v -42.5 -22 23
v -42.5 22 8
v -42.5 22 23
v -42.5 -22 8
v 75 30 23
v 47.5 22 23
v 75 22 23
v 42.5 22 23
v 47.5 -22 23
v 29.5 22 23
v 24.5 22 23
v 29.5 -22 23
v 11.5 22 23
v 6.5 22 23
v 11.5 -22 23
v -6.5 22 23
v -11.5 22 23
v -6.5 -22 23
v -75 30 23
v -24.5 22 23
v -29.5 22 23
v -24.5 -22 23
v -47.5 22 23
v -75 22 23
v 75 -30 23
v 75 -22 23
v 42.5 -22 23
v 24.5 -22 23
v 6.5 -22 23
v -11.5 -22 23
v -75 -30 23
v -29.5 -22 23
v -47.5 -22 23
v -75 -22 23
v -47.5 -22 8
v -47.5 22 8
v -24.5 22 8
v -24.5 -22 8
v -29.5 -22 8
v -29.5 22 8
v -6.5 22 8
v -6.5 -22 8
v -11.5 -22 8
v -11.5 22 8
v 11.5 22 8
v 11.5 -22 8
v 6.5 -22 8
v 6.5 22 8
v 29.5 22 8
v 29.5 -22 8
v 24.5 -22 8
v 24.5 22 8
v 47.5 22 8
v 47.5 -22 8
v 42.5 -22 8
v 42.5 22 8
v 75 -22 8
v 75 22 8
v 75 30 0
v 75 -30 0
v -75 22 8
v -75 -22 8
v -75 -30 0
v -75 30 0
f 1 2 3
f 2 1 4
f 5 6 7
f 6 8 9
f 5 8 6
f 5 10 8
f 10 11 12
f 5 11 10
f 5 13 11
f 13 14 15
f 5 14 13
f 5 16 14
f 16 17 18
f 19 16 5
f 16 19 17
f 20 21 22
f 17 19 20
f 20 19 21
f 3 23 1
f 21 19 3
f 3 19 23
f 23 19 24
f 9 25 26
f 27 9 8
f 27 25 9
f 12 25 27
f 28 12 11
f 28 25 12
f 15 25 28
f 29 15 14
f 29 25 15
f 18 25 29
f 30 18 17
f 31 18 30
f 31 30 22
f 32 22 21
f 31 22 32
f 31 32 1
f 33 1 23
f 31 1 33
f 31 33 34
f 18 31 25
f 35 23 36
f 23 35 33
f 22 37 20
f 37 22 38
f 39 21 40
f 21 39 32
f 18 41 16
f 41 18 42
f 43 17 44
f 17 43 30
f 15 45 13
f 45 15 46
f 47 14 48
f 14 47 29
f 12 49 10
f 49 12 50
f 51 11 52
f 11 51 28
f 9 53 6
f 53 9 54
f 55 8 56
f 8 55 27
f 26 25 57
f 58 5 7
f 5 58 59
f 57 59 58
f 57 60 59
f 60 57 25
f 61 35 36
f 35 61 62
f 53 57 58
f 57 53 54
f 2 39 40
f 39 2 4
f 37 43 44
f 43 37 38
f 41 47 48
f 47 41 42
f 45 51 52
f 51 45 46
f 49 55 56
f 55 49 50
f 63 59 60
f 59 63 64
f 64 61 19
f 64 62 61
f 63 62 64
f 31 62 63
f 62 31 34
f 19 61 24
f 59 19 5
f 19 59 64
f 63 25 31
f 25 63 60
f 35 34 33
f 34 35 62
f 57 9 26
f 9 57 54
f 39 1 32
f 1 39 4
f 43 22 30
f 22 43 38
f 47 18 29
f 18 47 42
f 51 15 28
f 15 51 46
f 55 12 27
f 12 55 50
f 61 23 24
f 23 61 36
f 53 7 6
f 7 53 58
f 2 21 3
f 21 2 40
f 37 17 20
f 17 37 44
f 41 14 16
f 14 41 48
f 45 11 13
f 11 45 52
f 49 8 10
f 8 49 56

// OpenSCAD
$fn = 32;

// ----------------------------------------------------------------------
// Rib frame 150 x 60 x 23
// 6 ribs at 18 mm pitch
// ----------------------------------------------------------------------

// --- parameters (mm) ---
frame = [150, 60, 8];  // base plate size (x, y, z)
rail_w = 8;            // side rail width
ribs = 6;              // number of ribs
rib_t = 5;             // rib thickness
rib_h = 15;            // rib height above the base plate
pitch = 18;            // pitch between rib centres

// --- derived feature positions (mm) ---
span = (ribs - 1) * pitch;          // = 90   distance between the outer ribs
origin_x = -span / 2;               // = -45   X of the first rib
rib_len = frame[1] - 2 * rail_w + 2;  // = 46   rib length, 1 mm into each rail
feature_centers = [
  [origin_x + 0 * pitch, 0],
  [origin_x + 1 * pitch, 0],
  [origin_x + 2 * pitch, 0],
  [origin_x + 3 * pitch, 0],
  [origin_x + 4 * pitch, 0],
  [origin_x + 5 * pitch, 0]
];   // rib centre line, drives the rib loop

// base plate, two side rails, then the ribs read straight off feature_centers
union() {
  translate([-frame[0] / 2, -frame[1] / 2, 0]) cube(frame);
  translate([-frame[0] / 2, -frame[1] / 2, 0]) cube([frame[0], rail_w, frame[2] + rib_h]);
  translate([-frame[0] / 2, frame[1] / 2 - rail_w, 0]) cube([frame[0], rail_w, frame[2] + rib_h]);
  for (centre = feature_centers)
    translate([centre[0] - rib_t / 2, centre[1] - rib_len / 2, frame[2] - 1])
      cube([rib_t, rib_len, rib_h + 1]);
}
